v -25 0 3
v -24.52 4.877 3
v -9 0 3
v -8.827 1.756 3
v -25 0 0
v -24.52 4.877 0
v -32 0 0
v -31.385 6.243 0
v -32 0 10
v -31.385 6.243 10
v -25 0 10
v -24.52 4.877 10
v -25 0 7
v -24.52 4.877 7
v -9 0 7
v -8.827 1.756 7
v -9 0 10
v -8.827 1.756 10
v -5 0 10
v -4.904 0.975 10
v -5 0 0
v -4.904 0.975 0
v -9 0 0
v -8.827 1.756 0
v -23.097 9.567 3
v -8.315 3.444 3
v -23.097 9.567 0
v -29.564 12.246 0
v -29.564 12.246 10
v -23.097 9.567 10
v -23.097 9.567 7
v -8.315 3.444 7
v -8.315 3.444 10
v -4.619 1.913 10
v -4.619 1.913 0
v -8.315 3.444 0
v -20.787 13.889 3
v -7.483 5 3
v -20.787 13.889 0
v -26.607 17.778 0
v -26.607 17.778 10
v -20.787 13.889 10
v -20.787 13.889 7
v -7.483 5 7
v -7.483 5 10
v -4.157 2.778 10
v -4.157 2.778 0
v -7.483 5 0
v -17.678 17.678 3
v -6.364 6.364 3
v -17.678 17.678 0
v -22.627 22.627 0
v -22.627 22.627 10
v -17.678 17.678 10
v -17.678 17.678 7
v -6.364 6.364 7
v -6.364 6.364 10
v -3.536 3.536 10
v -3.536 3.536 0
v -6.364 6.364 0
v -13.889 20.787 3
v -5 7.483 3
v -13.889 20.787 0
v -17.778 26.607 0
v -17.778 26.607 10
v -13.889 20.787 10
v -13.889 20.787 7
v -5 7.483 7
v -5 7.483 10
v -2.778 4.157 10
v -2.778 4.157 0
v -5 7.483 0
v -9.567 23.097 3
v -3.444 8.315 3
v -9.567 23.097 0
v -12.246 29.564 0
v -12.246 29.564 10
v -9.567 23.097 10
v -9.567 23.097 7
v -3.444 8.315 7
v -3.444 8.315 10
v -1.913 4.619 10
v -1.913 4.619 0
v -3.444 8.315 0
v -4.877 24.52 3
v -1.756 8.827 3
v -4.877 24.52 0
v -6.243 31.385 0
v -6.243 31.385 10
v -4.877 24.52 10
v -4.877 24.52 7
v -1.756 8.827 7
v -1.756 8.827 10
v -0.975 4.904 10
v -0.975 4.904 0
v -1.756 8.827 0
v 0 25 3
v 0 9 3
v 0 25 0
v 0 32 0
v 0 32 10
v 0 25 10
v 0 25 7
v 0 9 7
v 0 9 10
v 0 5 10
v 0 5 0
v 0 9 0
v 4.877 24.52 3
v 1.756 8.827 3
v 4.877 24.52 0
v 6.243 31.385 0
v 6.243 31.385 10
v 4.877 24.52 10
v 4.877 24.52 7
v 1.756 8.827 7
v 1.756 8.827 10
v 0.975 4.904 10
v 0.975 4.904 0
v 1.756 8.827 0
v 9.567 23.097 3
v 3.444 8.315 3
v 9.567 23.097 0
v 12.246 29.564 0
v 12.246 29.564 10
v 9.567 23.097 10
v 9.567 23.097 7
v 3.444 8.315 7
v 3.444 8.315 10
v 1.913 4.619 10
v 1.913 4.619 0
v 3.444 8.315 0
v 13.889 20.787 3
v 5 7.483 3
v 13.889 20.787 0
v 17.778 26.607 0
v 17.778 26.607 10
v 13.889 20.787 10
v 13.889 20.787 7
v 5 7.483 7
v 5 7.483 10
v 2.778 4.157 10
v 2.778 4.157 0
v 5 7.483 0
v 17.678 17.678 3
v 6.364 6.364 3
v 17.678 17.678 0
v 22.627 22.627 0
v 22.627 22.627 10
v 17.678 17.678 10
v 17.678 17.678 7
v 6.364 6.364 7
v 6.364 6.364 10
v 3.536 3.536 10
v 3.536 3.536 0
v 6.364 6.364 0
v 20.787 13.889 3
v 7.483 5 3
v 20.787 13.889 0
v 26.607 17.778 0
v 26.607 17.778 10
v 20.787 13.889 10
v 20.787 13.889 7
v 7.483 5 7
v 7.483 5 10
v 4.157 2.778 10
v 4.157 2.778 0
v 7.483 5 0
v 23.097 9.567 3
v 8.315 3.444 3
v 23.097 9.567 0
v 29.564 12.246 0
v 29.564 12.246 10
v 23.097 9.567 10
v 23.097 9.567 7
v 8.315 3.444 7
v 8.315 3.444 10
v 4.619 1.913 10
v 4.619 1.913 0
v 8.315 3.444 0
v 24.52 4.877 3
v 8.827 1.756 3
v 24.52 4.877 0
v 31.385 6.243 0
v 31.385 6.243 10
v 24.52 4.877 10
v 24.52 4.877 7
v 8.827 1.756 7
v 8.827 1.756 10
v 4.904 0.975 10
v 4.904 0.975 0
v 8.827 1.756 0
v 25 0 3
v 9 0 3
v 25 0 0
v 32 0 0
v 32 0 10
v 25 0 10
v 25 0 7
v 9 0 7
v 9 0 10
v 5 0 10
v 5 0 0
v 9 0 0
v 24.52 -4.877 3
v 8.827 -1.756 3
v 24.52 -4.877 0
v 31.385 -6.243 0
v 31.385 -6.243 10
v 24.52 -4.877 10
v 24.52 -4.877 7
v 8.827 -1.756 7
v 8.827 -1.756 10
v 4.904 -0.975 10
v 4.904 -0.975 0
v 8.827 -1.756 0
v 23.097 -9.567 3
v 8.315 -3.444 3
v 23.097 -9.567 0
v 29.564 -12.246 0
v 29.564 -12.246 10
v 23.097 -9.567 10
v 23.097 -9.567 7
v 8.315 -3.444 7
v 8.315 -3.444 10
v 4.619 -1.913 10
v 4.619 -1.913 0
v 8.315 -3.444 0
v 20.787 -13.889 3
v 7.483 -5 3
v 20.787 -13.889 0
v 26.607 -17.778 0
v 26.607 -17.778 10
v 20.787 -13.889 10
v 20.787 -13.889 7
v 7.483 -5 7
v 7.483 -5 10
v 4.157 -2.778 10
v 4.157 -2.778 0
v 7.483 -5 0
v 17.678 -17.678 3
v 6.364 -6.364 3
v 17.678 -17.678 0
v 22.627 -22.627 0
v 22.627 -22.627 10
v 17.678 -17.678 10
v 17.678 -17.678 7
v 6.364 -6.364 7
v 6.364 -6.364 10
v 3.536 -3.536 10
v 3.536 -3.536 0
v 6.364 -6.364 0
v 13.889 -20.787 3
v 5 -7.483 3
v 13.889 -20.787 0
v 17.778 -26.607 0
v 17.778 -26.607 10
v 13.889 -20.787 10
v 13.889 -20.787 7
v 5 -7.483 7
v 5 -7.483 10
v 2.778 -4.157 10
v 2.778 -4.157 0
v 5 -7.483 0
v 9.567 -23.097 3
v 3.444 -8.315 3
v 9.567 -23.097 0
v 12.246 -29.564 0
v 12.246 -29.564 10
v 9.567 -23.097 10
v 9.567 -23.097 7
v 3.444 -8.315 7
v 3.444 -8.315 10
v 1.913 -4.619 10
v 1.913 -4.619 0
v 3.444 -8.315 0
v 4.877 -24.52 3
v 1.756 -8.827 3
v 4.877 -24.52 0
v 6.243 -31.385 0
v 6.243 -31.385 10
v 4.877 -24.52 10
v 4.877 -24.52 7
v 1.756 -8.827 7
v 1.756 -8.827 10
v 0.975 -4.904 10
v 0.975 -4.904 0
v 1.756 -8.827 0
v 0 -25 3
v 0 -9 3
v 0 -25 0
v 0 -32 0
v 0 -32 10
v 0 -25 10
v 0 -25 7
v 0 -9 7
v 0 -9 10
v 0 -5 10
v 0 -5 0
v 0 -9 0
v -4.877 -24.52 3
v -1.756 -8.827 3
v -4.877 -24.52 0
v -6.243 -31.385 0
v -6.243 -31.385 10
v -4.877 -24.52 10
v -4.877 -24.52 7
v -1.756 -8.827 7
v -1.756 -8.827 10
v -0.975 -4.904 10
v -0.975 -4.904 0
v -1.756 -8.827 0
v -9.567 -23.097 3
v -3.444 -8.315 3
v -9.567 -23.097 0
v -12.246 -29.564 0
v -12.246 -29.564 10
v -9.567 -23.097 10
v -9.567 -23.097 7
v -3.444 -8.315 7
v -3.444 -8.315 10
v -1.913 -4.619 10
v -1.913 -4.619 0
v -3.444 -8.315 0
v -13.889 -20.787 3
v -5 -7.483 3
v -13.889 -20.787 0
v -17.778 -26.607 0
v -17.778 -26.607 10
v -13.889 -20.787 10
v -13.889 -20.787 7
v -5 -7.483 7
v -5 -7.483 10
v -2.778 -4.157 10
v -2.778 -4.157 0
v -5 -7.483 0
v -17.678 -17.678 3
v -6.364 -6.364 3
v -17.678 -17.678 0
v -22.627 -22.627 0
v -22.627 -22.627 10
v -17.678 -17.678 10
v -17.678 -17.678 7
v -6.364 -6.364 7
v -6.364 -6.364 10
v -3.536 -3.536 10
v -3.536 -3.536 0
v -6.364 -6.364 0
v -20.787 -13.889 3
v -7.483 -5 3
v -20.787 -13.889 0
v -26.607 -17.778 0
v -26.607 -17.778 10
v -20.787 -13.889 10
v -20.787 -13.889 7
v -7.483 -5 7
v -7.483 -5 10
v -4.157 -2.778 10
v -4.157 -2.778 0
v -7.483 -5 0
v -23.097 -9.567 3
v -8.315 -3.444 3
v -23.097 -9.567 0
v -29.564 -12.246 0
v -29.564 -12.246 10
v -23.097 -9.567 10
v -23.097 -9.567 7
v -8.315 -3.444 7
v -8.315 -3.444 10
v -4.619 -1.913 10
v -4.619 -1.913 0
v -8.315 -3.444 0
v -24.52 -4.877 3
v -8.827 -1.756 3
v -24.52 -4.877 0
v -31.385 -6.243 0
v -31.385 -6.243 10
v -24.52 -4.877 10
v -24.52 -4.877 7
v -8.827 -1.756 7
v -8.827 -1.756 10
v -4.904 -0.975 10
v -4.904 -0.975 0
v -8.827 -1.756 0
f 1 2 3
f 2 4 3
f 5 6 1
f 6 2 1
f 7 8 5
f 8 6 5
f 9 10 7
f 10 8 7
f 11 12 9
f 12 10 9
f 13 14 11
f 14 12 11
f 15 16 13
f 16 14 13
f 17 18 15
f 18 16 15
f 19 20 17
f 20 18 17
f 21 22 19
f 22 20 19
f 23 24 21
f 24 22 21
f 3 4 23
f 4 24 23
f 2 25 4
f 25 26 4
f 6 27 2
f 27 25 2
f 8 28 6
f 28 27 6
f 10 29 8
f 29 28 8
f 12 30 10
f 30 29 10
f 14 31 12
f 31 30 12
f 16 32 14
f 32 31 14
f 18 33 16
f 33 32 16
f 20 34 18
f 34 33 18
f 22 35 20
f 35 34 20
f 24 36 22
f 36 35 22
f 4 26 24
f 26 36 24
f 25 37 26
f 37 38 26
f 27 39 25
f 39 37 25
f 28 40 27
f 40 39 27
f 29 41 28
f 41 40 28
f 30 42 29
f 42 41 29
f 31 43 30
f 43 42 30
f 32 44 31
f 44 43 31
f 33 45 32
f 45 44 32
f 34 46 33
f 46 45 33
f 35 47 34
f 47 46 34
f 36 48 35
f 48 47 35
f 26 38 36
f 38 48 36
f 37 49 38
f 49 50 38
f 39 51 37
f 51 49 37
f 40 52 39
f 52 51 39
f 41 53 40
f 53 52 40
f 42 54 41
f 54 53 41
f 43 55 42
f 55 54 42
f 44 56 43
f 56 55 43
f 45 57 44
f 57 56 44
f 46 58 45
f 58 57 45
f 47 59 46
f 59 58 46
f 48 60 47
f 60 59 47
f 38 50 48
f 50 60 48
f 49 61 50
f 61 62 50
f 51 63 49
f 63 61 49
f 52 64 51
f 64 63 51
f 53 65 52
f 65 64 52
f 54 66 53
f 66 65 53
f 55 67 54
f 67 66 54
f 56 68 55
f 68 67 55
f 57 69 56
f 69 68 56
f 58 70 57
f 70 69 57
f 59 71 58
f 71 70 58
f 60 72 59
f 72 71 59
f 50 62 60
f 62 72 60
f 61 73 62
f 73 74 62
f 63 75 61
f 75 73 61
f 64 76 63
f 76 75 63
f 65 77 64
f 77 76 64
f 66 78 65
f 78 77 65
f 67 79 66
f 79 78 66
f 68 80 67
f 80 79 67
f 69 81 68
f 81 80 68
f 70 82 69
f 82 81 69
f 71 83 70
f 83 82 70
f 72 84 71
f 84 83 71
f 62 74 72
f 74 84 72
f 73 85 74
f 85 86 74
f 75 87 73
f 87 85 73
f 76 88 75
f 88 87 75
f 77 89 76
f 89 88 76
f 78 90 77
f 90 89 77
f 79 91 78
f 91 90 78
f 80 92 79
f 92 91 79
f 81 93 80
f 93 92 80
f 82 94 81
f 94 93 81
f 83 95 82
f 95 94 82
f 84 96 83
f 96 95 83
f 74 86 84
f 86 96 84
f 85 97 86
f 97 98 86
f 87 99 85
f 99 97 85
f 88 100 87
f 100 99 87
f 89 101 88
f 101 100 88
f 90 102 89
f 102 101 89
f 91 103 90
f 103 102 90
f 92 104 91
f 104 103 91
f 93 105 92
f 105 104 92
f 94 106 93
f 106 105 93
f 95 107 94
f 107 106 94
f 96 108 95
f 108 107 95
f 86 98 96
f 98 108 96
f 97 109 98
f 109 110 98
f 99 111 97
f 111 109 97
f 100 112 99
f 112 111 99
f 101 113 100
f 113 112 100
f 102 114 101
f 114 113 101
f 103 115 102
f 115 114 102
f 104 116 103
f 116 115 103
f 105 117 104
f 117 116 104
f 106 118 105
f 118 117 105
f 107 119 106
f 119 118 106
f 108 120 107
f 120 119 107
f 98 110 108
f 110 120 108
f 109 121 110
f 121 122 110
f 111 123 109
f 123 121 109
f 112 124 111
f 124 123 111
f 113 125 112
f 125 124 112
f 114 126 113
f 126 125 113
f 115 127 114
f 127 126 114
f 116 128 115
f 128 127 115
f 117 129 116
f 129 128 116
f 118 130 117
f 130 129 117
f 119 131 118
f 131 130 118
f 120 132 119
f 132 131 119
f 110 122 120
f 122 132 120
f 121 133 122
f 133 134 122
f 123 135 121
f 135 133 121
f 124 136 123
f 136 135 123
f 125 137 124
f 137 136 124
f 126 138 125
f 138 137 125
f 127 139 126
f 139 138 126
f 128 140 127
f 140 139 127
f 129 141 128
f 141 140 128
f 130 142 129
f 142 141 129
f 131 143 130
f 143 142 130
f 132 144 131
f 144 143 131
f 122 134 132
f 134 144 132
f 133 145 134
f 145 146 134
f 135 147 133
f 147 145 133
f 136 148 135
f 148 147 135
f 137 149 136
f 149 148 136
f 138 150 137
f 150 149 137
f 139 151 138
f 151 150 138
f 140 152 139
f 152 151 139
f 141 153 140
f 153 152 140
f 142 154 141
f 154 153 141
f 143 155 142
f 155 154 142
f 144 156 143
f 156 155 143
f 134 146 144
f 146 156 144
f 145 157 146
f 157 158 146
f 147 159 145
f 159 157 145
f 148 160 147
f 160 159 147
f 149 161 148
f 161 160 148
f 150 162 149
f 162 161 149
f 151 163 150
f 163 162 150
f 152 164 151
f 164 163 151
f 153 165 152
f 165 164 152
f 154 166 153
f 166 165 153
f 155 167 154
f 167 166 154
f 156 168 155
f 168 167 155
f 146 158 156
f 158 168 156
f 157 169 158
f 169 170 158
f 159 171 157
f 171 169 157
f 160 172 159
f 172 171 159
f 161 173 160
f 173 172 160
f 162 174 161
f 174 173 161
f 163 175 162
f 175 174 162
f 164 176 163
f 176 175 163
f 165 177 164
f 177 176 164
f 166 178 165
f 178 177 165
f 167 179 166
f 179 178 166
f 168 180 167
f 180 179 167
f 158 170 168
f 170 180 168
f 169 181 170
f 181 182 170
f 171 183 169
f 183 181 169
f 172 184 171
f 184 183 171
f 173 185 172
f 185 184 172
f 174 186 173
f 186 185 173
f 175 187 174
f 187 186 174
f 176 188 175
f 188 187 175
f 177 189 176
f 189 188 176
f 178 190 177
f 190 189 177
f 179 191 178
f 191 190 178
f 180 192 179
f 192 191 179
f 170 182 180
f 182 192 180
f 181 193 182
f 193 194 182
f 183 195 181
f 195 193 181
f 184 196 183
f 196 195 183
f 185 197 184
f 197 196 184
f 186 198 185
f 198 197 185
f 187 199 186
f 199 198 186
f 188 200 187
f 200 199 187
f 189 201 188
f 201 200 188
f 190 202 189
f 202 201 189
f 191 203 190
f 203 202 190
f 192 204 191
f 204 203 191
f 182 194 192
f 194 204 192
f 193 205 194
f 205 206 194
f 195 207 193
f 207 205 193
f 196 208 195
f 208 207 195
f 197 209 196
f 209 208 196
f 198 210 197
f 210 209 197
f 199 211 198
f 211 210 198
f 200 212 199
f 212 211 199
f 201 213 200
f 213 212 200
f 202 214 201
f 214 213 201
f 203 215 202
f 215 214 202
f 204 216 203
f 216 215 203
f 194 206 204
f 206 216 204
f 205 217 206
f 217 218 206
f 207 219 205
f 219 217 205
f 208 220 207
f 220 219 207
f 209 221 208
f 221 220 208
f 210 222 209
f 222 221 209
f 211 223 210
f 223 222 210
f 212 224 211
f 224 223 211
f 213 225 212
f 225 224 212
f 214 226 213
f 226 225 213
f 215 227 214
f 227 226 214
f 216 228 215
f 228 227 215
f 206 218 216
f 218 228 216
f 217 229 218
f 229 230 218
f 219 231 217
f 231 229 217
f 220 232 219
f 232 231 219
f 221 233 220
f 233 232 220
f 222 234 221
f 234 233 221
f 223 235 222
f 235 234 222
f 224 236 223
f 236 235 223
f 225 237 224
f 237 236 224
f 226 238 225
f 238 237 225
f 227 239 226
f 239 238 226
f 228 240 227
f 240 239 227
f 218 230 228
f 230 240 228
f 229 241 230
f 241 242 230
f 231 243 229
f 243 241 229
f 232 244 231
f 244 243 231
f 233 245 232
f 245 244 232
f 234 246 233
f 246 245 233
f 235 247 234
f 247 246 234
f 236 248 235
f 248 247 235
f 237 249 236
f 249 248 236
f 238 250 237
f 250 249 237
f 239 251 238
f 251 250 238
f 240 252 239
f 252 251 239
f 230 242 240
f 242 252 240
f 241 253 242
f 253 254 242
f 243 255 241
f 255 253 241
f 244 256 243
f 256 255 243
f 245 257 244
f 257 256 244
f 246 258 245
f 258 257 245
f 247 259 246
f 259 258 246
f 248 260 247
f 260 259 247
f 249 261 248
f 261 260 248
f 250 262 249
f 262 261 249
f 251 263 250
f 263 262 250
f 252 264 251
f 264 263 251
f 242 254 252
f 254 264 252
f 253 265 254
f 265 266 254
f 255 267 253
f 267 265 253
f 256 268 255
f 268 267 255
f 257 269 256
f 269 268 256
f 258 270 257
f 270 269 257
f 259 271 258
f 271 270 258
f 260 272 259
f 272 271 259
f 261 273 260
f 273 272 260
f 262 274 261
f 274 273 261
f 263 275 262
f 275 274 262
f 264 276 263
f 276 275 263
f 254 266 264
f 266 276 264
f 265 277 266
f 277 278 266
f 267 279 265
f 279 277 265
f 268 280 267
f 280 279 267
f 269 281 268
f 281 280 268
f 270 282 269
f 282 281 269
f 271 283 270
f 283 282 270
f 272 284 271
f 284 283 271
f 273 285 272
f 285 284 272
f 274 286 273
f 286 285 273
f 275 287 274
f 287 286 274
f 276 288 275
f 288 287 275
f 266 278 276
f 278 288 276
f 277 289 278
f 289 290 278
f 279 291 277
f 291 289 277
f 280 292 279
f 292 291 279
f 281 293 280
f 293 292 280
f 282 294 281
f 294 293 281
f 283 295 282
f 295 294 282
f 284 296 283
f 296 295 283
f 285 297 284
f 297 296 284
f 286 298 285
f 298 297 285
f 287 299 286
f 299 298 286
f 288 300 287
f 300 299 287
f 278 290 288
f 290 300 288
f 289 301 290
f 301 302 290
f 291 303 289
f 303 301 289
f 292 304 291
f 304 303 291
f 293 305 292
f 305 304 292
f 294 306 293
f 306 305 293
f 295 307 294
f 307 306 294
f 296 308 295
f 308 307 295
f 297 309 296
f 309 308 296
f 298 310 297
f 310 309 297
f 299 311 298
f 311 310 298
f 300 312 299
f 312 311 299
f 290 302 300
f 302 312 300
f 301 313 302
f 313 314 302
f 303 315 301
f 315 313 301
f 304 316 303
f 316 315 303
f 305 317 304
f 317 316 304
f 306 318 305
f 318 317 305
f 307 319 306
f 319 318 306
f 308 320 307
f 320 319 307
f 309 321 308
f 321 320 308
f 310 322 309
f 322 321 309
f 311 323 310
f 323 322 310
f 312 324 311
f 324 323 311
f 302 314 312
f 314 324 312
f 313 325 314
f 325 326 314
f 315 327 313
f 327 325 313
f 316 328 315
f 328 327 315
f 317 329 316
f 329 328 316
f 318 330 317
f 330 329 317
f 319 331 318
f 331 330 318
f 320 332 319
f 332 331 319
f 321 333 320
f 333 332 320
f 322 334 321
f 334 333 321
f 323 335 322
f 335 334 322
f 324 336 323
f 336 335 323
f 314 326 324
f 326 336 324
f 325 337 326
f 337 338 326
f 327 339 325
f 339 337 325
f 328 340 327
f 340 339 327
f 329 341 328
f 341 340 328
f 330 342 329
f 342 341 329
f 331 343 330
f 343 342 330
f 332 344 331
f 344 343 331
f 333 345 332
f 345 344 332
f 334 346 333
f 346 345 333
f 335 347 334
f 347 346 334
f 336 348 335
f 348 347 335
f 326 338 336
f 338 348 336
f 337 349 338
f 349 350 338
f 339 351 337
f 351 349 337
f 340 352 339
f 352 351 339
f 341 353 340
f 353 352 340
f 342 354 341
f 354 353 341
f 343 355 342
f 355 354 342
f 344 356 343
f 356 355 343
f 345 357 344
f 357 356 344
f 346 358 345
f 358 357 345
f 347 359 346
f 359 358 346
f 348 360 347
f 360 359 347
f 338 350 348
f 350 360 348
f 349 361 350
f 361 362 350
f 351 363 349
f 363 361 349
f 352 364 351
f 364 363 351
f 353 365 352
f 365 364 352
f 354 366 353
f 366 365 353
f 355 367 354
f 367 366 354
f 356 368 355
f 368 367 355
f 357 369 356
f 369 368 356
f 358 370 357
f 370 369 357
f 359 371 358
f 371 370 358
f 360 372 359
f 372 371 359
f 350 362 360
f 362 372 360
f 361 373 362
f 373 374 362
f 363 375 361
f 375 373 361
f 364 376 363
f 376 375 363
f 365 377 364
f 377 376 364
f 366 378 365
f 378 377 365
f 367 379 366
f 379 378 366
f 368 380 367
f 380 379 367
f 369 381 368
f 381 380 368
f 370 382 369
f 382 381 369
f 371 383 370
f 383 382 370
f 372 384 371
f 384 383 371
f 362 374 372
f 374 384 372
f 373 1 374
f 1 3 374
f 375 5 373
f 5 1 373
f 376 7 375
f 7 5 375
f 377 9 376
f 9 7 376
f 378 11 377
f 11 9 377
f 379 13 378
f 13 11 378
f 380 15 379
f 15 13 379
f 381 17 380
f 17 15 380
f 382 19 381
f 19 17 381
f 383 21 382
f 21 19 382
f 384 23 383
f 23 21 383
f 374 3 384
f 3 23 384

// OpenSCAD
$fn = 32;

// ----------------------------------------------------------------------
// Revolved part: handwheel R32
// ----------------------------------------------------------------------

// --- parameters (mm) ---
bore_r = 5;               // bore radius
rim_r = 32;               // rim radius
rim_w = 7;                // rim axial width
rim_t = 10;               // rim diameter height
hub_r = 9;                // hub radius
web_t = 4;                // web thickness
revolve_angle = 360;      // revolve sweep, degrees
fit_tol = 0.05;           // declared fit tolerance (prompt contract)
free_tol = 0.2;           // declared free tolerance (prompt contract)

bore_d = 2 * bore_r;
rim_d = 2 * rim_r;
hub_d = 2 * hub_r;

profile = [[5, 0], [9, 0], [9, 3], [25, 3], [25, 0], [32, 0], [32, 10], [25, 10], [25, 7], [9, 7], [9, 10], [5, 10]];  // primary outline, 12 points, counter clockwise

// --- the one profile operation ---
rotate_extrude(angle = revolve_angle) polygon(points = profile);
